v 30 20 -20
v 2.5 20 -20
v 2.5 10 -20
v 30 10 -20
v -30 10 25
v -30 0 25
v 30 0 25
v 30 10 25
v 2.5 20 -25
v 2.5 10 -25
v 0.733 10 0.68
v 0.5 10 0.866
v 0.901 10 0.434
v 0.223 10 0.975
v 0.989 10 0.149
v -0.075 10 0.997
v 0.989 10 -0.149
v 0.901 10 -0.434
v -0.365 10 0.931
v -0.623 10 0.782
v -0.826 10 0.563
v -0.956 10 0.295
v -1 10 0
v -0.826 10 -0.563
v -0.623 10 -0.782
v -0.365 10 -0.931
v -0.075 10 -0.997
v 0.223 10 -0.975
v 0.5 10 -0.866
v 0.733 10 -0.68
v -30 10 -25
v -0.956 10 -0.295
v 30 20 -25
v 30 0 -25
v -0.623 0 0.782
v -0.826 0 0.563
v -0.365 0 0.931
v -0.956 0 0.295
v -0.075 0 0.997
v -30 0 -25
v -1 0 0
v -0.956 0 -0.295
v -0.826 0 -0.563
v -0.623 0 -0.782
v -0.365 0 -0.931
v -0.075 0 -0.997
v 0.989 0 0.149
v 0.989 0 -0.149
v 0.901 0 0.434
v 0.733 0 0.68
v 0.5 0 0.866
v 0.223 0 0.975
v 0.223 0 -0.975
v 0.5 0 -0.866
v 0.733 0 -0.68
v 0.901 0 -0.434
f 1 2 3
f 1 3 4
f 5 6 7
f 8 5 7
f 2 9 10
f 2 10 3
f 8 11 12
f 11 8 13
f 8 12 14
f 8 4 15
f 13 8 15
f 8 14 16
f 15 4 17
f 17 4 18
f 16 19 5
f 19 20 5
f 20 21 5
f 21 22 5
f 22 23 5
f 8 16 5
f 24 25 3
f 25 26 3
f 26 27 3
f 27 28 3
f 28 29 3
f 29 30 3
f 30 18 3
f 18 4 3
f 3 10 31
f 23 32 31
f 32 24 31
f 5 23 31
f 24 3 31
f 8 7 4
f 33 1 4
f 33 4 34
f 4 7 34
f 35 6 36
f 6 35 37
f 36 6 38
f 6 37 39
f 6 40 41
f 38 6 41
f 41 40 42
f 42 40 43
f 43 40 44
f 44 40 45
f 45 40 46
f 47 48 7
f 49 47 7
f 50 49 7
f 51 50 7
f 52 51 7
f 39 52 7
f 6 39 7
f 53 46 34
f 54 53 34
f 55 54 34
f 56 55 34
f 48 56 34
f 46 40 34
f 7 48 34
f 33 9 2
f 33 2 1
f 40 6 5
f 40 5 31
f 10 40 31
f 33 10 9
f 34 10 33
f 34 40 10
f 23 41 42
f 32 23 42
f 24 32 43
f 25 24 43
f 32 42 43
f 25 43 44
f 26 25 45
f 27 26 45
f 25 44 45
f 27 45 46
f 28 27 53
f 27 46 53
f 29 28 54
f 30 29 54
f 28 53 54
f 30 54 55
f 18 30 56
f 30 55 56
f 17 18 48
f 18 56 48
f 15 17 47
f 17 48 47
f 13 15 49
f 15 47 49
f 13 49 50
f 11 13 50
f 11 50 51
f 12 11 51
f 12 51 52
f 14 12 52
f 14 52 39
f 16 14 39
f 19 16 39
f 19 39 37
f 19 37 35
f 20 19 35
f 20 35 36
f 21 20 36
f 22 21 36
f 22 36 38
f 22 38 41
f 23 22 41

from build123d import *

# Parameters (mm, degrees)
SKETCH1_W             = 60
SKETCH1_H             = 50
BOSS_EXTRUDE1_DEPTH   = 20
CUT_EXTRUDE1_DEPTH    = 10
F_2MM_DIAMETER_HOLE_D = 2


with BuildPart() as part:
    # Sketch1 → Boss-Extrude1 (new body)
    with BuildSketch(Plane(origin=(0, 0, 0), x_dir=(1, 0, 0), z_dir=(0, 1, 0))):
        Rectangle(SKETCH1_W, SKETCH1_H)
    extrude(amount=BOSS_EXTRUDE1_DEPTH)

    # Sketch2 → Cut-Extrude1 (cut)
    with BuildSketch(Plane(origin=(0, 20, 0), x_dir=(1, 0, 0), z_dir=(0, 1, 0))):
        Polygon((-30, 25), (2.5, 25), (2.5, 20), (30, 20), (30, -25), (2.5, -25), (-30, -25), align=None)
    extrude(amount=-CUT_EXTRUDE1_DEPTH, mode=Mode.SUBTRACT)

    # 2mm Diameter Hole (through all)
    with Locations(Plane(origin=(0, 10, 0), x_dir=(1, 0, 0), z_dir=(0, 1, 0))):
        with Locations((0, 0)):
            Hole(F_2MM_DIAMETER_HOLE_D / 2)


solid = part.part
